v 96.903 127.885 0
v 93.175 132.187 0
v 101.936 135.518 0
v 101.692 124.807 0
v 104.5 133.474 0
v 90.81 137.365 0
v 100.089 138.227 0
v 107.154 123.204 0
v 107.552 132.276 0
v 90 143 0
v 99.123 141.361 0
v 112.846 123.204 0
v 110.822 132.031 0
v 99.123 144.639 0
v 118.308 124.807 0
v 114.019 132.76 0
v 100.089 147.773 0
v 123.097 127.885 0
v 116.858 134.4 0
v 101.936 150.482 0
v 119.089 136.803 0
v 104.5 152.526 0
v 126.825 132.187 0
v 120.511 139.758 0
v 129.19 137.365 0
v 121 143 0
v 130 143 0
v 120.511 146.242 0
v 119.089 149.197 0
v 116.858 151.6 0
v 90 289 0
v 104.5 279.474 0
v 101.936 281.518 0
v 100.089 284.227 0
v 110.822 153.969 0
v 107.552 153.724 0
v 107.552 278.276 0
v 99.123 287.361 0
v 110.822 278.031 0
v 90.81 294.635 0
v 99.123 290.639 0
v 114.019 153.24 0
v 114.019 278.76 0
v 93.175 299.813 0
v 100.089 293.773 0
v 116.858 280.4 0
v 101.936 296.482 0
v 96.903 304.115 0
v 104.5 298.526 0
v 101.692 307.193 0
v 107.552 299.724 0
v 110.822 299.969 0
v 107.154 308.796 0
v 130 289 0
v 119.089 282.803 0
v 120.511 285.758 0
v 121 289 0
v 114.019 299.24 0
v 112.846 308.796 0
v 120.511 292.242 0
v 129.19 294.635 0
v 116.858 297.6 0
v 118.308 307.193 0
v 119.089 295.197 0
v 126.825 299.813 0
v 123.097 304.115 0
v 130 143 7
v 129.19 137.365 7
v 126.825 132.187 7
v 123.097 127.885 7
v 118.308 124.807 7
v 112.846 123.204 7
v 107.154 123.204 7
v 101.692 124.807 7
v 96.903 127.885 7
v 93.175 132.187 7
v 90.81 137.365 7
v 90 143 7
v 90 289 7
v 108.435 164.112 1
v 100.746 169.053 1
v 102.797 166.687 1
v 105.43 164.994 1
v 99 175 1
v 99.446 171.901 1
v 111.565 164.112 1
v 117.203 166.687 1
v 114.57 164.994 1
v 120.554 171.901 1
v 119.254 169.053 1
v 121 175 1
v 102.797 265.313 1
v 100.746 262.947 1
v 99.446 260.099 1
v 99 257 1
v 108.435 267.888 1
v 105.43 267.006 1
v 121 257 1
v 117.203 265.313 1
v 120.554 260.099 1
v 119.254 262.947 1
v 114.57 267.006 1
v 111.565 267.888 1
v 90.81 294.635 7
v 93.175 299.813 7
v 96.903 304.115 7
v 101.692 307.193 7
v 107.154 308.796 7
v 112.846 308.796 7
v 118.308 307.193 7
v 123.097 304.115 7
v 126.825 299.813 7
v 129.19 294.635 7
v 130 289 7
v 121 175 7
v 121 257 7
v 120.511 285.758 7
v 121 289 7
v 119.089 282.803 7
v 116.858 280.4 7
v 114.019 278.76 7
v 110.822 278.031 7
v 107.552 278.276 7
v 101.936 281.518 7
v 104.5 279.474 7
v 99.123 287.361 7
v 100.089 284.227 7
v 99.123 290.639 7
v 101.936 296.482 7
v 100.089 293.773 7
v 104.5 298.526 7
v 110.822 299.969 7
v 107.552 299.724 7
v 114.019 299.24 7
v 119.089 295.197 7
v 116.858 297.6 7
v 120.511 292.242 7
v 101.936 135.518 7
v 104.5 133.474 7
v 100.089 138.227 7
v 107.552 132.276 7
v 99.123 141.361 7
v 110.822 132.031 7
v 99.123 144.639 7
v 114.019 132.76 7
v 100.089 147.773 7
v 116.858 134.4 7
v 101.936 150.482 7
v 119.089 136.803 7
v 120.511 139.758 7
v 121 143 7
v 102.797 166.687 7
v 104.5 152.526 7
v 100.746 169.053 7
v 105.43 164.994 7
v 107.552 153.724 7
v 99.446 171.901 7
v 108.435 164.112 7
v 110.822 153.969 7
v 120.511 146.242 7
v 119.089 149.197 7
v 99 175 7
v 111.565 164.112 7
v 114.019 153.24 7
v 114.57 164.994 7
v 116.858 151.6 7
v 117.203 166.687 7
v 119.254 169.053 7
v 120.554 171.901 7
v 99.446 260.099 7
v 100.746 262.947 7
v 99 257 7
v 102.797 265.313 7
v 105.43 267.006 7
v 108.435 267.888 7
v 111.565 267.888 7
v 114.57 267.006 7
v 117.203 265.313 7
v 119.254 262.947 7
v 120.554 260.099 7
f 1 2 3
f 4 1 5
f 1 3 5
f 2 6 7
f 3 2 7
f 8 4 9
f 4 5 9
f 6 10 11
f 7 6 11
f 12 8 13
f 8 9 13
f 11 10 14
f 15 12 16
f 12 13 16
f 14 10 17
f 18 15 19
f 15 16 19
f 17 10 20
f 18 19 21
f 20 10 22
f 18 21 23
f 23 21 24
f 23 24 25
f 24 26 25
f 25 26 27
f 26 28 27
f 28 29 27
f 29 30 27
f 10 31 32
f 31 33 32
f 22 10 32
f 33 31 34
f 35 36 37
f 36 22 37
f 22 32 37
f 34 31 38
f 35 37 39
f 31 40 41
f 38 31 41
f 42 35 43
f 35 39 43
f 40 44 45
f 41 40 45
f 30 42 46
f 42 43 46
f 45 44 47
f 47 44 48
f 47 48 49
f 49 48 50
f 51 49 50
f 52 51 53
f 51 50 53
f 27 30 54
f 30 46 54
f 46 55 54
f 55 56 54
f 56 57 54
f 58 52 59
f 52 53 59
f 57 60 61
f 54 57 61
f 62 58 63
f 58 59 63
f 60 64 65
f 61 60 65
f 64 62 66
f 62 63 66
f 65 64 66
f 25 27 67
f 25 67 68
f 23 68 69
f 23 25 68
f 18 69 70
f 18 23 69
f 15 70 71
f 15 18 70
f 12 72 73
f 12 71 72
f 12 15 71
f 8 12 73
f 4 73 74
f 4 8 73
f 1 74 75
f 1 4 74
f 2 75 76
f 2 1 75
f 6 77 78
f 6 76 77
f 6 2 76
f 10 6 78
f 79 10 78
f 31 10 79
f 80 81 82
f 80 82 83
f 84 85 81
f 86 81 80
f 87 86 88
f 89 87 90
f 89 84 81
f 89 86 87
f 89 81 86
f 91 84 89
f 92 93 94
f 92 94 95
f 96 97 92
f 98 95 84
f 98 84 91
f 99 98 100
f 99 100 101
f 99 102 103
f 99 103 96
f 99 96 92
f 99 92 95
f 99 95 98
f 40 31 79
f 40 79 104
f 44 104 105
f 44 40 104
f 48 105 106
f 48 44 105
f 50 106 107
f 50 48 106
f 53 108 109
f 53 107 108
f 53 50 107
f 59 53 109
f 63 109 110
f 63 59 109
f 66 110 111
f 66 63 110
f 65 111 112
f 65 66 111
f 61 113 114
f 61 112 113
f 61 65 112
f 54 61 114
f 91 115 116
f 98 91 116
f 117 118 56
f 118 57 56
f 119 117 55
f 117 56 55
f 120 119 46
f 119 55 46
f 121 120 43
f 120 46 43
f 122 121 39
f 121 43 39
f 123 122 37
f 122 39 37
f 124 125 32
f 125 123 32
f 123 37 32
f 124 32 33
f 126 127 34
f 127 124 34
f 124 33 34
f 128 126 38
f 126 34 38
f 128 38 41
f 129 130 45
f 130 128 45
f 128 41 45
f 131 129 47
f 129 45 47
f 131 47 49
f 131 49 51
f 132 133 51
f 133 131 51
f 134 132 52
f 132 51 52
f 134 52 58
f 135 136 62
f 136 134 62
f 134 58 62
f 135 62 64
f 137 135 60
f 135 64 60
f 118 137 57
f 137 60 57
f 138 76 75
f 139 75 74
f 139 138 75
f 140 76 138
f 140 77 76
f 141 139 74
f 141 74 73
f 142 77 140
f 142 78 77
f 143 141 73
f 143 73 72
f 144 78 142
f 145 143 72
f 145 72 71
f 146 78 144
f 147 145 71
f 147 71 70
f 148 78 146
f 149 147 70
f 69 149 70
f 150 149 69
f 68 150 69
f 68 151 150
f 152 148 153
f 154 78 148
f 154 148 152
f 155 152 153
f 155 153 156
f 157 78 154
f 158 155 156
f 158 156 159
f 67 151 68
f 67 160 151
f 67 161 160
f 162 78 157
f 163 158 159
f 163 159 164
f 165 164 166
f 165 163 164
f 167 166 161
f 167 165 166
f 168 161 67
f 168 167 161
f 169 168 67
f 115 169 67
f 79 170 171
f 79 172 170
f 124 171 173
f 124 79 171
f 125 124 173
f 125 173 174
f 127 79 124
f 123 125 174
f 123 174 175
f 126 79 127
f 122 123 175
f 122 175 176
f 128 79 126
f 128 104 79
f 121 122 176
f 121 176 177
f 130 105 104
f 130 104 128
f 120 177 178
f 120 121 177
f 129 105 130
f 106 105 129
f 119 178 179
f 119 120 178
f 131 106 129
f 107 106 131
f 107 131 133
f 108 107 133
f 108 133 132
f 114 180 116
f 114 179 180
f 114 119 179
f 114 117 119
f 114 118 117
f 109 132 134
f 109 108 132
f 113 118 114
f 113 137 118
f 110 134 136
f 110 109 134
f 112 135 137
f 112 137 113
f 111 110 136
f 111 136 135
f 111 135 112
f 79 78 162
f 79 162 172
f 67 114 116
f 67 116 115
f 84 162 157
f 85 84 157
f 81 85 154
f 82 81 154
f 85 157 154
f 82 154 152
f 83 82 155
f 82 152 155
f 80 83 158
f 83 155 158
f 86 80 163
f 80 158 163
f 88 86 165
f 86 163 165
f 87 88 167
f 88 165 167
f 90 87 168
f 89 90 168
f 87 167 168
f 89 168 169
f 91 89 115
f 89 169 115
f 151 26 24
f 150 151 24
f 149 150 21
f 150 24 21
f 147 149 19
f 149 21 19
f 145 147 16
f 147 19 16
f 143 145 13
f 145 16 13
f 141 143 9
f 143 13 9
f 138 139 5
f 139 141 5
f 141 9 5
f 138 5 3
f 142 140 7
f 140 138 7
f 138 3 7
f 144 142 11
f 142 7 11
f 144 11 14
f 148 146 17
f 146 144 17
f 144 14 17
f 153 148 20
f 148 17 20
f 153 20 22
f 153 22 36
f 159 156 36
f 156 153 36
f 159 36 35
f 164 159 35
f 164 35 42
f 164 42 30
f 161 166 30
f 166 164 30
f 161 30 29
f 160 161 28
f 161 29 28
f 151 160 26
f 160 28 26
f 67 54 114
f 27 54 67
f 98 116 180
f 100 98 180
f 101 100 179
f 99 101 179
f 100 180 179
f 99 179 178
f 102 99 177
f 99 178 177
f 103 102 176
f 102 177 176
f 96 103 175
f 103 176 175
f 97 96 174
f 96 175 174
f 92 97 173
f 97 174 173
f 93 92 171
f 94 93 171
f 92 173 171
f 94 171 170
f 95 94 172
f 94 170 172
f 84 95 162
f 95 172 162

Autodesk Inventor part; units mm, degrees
ref_plane "YZ Plane" through (0, 0, 0) normal (1, 0, 0) x (0, 1, 0)
ref_plane "XZ Plane" through (0, 0, 0) normal (0, 1, 0) x (-1, 0, 0)
ref_plane "XY Plane" through (0, 0, 0) normal (0, 0, 1) x (1, 0, 0)
sketch "Sketch1" plane through (0, 0, 0) normal (0, 0, 1) x (1, 0, 0)
  line L0 (0, 0) -> (220, 0) construction
  line L1 (220, 0) -> (220, 9) construction
  line L2 (220, 9) -> (0, 9) construction
  line L3 (0, 9) -> (0, 0) construction
  line L4 (0, 9) -> (90.94, 295.0593) construction
  line L5 (129.06, 295.0593) -> (220, 9) construction
  circle A0 centre (110, 289) radius 11 construction
  line L6 (96.1101, 281.616) -> (103.5522, 305.0259) construction
  arc A1 (129.06, 295.0593) -> (90.94, 295.0593) centre (110, 289) ccw construction
  line L7 (99, 275.5567) -> (99, 269.1274) construction
  line L8 (110, 289) -> (110, 143) construction
  line L9 (130, 289) -> (130, 143)
  line L10 (90, 143) -> (90, 289)
  arc A2 (130, 289) -> (90, 289) centre (110, 289) ccw
  arc A3 (90, 143) -> (130, 143) centre (110, 143) ccw
  line L11 (292.2692, 143) -> (292.2692, 247) construction
  line L12 (312.2692, 143) -> (312.2692, 247) construction
  line L13 (272.2692, 247) -> (272.2692, 143) construction
  arc A4 (272.2692, 143) -> (312.2692, 143) centre (292.2692, 143) ccw construction
  arc A5 (312.2692, 247) -> (272.2692, 247) centre (292.2692, 247) ccw construction
  arc A6 (90, 289) -> (130, 289) centre (110, 289) ccw construction
  line L14 (101.1908, 269) -> (118.8092, 269) construction
  line L15 (211.2941, 267) -> (373.2442, 267) construction
  line L16 (211.2941, 143) -> (373.2442, 143) construction
  line L17 (292.2692, 143) -> (292.2692, 39) construction
  line L18 (312.2692, 143) -> (312.2692, 39) construction
  line L19 (272.2692, 39) -> (272.2692, 143) construction
  arc A7 (312.2692, 143) -> (272.2692, 143) centre (292.2692, 143) ccw construction
  arc A8 (272.2692, 39) -> (312.2692, 39) centre (292.2692, 39) ccw construction
  line L20 (211.2941, 19) -> (373.2442, 19) construction
  circle A9 centre (110, 289) radius 11
  circle A10 centre (110, 143) radius 11
  point P0 (110, 0)
  point P1 (110, 216)
  point P2 (110, 309)
  point P3 (292.2692, 195)
  point P4 (110, 269)
  point P5 (110, 269)
  point P6 (292.2692, 267)
  dimension "d0" = 9
  dimension "d1" = 220
  dimension "d2" = 22
  dimension "d3" = 280
  dimension "d4" = 9
  dimension "d7" = 40
  dimension "d8" = 40
  dimension "pendgap" = 2
  dimension "abovethefloor" = 10
  dimension "d11" = 104
  dimension "d12" = 146
  dimension "d14" = 22
extrude "Extrusion2" add sketch "Sketch1" along normal blind 7
sketch "Sketch3" plane through (0, 0, 7) normal (0, 0, 1) x (1, 0, 0)
  line L0 (110, 175) -> (110, 257) construction
  line L1 (90, 289) -> (90, 143) projected
  line L2 (121, 175) -> (121, 257)
  line L3 (99, 257) -> (99, 175)
  arc A0 (99, 175) -> (121, 175) centre (110, 175) ccw
  arc A1 (121, 257) -> (99, 257) centre (110, 257) ccw
  line L4 (110, 268) -> (110, 278) construction
  circle A2 centre (110, 289) radius 11 projected
  circle A3 centre (110, 289) radius 11 construction
  circle A4 centre (110, 143) radius 11 projected
  point P0 (0, 0)
  point P1 (110, 216)
  point P2 (90, 216)
  dimension "d18" = 10
extrude "Extrusion3" cut sketch "Sketch3" against normal blind 6
properties part number "DBP-2-pendulum1"
